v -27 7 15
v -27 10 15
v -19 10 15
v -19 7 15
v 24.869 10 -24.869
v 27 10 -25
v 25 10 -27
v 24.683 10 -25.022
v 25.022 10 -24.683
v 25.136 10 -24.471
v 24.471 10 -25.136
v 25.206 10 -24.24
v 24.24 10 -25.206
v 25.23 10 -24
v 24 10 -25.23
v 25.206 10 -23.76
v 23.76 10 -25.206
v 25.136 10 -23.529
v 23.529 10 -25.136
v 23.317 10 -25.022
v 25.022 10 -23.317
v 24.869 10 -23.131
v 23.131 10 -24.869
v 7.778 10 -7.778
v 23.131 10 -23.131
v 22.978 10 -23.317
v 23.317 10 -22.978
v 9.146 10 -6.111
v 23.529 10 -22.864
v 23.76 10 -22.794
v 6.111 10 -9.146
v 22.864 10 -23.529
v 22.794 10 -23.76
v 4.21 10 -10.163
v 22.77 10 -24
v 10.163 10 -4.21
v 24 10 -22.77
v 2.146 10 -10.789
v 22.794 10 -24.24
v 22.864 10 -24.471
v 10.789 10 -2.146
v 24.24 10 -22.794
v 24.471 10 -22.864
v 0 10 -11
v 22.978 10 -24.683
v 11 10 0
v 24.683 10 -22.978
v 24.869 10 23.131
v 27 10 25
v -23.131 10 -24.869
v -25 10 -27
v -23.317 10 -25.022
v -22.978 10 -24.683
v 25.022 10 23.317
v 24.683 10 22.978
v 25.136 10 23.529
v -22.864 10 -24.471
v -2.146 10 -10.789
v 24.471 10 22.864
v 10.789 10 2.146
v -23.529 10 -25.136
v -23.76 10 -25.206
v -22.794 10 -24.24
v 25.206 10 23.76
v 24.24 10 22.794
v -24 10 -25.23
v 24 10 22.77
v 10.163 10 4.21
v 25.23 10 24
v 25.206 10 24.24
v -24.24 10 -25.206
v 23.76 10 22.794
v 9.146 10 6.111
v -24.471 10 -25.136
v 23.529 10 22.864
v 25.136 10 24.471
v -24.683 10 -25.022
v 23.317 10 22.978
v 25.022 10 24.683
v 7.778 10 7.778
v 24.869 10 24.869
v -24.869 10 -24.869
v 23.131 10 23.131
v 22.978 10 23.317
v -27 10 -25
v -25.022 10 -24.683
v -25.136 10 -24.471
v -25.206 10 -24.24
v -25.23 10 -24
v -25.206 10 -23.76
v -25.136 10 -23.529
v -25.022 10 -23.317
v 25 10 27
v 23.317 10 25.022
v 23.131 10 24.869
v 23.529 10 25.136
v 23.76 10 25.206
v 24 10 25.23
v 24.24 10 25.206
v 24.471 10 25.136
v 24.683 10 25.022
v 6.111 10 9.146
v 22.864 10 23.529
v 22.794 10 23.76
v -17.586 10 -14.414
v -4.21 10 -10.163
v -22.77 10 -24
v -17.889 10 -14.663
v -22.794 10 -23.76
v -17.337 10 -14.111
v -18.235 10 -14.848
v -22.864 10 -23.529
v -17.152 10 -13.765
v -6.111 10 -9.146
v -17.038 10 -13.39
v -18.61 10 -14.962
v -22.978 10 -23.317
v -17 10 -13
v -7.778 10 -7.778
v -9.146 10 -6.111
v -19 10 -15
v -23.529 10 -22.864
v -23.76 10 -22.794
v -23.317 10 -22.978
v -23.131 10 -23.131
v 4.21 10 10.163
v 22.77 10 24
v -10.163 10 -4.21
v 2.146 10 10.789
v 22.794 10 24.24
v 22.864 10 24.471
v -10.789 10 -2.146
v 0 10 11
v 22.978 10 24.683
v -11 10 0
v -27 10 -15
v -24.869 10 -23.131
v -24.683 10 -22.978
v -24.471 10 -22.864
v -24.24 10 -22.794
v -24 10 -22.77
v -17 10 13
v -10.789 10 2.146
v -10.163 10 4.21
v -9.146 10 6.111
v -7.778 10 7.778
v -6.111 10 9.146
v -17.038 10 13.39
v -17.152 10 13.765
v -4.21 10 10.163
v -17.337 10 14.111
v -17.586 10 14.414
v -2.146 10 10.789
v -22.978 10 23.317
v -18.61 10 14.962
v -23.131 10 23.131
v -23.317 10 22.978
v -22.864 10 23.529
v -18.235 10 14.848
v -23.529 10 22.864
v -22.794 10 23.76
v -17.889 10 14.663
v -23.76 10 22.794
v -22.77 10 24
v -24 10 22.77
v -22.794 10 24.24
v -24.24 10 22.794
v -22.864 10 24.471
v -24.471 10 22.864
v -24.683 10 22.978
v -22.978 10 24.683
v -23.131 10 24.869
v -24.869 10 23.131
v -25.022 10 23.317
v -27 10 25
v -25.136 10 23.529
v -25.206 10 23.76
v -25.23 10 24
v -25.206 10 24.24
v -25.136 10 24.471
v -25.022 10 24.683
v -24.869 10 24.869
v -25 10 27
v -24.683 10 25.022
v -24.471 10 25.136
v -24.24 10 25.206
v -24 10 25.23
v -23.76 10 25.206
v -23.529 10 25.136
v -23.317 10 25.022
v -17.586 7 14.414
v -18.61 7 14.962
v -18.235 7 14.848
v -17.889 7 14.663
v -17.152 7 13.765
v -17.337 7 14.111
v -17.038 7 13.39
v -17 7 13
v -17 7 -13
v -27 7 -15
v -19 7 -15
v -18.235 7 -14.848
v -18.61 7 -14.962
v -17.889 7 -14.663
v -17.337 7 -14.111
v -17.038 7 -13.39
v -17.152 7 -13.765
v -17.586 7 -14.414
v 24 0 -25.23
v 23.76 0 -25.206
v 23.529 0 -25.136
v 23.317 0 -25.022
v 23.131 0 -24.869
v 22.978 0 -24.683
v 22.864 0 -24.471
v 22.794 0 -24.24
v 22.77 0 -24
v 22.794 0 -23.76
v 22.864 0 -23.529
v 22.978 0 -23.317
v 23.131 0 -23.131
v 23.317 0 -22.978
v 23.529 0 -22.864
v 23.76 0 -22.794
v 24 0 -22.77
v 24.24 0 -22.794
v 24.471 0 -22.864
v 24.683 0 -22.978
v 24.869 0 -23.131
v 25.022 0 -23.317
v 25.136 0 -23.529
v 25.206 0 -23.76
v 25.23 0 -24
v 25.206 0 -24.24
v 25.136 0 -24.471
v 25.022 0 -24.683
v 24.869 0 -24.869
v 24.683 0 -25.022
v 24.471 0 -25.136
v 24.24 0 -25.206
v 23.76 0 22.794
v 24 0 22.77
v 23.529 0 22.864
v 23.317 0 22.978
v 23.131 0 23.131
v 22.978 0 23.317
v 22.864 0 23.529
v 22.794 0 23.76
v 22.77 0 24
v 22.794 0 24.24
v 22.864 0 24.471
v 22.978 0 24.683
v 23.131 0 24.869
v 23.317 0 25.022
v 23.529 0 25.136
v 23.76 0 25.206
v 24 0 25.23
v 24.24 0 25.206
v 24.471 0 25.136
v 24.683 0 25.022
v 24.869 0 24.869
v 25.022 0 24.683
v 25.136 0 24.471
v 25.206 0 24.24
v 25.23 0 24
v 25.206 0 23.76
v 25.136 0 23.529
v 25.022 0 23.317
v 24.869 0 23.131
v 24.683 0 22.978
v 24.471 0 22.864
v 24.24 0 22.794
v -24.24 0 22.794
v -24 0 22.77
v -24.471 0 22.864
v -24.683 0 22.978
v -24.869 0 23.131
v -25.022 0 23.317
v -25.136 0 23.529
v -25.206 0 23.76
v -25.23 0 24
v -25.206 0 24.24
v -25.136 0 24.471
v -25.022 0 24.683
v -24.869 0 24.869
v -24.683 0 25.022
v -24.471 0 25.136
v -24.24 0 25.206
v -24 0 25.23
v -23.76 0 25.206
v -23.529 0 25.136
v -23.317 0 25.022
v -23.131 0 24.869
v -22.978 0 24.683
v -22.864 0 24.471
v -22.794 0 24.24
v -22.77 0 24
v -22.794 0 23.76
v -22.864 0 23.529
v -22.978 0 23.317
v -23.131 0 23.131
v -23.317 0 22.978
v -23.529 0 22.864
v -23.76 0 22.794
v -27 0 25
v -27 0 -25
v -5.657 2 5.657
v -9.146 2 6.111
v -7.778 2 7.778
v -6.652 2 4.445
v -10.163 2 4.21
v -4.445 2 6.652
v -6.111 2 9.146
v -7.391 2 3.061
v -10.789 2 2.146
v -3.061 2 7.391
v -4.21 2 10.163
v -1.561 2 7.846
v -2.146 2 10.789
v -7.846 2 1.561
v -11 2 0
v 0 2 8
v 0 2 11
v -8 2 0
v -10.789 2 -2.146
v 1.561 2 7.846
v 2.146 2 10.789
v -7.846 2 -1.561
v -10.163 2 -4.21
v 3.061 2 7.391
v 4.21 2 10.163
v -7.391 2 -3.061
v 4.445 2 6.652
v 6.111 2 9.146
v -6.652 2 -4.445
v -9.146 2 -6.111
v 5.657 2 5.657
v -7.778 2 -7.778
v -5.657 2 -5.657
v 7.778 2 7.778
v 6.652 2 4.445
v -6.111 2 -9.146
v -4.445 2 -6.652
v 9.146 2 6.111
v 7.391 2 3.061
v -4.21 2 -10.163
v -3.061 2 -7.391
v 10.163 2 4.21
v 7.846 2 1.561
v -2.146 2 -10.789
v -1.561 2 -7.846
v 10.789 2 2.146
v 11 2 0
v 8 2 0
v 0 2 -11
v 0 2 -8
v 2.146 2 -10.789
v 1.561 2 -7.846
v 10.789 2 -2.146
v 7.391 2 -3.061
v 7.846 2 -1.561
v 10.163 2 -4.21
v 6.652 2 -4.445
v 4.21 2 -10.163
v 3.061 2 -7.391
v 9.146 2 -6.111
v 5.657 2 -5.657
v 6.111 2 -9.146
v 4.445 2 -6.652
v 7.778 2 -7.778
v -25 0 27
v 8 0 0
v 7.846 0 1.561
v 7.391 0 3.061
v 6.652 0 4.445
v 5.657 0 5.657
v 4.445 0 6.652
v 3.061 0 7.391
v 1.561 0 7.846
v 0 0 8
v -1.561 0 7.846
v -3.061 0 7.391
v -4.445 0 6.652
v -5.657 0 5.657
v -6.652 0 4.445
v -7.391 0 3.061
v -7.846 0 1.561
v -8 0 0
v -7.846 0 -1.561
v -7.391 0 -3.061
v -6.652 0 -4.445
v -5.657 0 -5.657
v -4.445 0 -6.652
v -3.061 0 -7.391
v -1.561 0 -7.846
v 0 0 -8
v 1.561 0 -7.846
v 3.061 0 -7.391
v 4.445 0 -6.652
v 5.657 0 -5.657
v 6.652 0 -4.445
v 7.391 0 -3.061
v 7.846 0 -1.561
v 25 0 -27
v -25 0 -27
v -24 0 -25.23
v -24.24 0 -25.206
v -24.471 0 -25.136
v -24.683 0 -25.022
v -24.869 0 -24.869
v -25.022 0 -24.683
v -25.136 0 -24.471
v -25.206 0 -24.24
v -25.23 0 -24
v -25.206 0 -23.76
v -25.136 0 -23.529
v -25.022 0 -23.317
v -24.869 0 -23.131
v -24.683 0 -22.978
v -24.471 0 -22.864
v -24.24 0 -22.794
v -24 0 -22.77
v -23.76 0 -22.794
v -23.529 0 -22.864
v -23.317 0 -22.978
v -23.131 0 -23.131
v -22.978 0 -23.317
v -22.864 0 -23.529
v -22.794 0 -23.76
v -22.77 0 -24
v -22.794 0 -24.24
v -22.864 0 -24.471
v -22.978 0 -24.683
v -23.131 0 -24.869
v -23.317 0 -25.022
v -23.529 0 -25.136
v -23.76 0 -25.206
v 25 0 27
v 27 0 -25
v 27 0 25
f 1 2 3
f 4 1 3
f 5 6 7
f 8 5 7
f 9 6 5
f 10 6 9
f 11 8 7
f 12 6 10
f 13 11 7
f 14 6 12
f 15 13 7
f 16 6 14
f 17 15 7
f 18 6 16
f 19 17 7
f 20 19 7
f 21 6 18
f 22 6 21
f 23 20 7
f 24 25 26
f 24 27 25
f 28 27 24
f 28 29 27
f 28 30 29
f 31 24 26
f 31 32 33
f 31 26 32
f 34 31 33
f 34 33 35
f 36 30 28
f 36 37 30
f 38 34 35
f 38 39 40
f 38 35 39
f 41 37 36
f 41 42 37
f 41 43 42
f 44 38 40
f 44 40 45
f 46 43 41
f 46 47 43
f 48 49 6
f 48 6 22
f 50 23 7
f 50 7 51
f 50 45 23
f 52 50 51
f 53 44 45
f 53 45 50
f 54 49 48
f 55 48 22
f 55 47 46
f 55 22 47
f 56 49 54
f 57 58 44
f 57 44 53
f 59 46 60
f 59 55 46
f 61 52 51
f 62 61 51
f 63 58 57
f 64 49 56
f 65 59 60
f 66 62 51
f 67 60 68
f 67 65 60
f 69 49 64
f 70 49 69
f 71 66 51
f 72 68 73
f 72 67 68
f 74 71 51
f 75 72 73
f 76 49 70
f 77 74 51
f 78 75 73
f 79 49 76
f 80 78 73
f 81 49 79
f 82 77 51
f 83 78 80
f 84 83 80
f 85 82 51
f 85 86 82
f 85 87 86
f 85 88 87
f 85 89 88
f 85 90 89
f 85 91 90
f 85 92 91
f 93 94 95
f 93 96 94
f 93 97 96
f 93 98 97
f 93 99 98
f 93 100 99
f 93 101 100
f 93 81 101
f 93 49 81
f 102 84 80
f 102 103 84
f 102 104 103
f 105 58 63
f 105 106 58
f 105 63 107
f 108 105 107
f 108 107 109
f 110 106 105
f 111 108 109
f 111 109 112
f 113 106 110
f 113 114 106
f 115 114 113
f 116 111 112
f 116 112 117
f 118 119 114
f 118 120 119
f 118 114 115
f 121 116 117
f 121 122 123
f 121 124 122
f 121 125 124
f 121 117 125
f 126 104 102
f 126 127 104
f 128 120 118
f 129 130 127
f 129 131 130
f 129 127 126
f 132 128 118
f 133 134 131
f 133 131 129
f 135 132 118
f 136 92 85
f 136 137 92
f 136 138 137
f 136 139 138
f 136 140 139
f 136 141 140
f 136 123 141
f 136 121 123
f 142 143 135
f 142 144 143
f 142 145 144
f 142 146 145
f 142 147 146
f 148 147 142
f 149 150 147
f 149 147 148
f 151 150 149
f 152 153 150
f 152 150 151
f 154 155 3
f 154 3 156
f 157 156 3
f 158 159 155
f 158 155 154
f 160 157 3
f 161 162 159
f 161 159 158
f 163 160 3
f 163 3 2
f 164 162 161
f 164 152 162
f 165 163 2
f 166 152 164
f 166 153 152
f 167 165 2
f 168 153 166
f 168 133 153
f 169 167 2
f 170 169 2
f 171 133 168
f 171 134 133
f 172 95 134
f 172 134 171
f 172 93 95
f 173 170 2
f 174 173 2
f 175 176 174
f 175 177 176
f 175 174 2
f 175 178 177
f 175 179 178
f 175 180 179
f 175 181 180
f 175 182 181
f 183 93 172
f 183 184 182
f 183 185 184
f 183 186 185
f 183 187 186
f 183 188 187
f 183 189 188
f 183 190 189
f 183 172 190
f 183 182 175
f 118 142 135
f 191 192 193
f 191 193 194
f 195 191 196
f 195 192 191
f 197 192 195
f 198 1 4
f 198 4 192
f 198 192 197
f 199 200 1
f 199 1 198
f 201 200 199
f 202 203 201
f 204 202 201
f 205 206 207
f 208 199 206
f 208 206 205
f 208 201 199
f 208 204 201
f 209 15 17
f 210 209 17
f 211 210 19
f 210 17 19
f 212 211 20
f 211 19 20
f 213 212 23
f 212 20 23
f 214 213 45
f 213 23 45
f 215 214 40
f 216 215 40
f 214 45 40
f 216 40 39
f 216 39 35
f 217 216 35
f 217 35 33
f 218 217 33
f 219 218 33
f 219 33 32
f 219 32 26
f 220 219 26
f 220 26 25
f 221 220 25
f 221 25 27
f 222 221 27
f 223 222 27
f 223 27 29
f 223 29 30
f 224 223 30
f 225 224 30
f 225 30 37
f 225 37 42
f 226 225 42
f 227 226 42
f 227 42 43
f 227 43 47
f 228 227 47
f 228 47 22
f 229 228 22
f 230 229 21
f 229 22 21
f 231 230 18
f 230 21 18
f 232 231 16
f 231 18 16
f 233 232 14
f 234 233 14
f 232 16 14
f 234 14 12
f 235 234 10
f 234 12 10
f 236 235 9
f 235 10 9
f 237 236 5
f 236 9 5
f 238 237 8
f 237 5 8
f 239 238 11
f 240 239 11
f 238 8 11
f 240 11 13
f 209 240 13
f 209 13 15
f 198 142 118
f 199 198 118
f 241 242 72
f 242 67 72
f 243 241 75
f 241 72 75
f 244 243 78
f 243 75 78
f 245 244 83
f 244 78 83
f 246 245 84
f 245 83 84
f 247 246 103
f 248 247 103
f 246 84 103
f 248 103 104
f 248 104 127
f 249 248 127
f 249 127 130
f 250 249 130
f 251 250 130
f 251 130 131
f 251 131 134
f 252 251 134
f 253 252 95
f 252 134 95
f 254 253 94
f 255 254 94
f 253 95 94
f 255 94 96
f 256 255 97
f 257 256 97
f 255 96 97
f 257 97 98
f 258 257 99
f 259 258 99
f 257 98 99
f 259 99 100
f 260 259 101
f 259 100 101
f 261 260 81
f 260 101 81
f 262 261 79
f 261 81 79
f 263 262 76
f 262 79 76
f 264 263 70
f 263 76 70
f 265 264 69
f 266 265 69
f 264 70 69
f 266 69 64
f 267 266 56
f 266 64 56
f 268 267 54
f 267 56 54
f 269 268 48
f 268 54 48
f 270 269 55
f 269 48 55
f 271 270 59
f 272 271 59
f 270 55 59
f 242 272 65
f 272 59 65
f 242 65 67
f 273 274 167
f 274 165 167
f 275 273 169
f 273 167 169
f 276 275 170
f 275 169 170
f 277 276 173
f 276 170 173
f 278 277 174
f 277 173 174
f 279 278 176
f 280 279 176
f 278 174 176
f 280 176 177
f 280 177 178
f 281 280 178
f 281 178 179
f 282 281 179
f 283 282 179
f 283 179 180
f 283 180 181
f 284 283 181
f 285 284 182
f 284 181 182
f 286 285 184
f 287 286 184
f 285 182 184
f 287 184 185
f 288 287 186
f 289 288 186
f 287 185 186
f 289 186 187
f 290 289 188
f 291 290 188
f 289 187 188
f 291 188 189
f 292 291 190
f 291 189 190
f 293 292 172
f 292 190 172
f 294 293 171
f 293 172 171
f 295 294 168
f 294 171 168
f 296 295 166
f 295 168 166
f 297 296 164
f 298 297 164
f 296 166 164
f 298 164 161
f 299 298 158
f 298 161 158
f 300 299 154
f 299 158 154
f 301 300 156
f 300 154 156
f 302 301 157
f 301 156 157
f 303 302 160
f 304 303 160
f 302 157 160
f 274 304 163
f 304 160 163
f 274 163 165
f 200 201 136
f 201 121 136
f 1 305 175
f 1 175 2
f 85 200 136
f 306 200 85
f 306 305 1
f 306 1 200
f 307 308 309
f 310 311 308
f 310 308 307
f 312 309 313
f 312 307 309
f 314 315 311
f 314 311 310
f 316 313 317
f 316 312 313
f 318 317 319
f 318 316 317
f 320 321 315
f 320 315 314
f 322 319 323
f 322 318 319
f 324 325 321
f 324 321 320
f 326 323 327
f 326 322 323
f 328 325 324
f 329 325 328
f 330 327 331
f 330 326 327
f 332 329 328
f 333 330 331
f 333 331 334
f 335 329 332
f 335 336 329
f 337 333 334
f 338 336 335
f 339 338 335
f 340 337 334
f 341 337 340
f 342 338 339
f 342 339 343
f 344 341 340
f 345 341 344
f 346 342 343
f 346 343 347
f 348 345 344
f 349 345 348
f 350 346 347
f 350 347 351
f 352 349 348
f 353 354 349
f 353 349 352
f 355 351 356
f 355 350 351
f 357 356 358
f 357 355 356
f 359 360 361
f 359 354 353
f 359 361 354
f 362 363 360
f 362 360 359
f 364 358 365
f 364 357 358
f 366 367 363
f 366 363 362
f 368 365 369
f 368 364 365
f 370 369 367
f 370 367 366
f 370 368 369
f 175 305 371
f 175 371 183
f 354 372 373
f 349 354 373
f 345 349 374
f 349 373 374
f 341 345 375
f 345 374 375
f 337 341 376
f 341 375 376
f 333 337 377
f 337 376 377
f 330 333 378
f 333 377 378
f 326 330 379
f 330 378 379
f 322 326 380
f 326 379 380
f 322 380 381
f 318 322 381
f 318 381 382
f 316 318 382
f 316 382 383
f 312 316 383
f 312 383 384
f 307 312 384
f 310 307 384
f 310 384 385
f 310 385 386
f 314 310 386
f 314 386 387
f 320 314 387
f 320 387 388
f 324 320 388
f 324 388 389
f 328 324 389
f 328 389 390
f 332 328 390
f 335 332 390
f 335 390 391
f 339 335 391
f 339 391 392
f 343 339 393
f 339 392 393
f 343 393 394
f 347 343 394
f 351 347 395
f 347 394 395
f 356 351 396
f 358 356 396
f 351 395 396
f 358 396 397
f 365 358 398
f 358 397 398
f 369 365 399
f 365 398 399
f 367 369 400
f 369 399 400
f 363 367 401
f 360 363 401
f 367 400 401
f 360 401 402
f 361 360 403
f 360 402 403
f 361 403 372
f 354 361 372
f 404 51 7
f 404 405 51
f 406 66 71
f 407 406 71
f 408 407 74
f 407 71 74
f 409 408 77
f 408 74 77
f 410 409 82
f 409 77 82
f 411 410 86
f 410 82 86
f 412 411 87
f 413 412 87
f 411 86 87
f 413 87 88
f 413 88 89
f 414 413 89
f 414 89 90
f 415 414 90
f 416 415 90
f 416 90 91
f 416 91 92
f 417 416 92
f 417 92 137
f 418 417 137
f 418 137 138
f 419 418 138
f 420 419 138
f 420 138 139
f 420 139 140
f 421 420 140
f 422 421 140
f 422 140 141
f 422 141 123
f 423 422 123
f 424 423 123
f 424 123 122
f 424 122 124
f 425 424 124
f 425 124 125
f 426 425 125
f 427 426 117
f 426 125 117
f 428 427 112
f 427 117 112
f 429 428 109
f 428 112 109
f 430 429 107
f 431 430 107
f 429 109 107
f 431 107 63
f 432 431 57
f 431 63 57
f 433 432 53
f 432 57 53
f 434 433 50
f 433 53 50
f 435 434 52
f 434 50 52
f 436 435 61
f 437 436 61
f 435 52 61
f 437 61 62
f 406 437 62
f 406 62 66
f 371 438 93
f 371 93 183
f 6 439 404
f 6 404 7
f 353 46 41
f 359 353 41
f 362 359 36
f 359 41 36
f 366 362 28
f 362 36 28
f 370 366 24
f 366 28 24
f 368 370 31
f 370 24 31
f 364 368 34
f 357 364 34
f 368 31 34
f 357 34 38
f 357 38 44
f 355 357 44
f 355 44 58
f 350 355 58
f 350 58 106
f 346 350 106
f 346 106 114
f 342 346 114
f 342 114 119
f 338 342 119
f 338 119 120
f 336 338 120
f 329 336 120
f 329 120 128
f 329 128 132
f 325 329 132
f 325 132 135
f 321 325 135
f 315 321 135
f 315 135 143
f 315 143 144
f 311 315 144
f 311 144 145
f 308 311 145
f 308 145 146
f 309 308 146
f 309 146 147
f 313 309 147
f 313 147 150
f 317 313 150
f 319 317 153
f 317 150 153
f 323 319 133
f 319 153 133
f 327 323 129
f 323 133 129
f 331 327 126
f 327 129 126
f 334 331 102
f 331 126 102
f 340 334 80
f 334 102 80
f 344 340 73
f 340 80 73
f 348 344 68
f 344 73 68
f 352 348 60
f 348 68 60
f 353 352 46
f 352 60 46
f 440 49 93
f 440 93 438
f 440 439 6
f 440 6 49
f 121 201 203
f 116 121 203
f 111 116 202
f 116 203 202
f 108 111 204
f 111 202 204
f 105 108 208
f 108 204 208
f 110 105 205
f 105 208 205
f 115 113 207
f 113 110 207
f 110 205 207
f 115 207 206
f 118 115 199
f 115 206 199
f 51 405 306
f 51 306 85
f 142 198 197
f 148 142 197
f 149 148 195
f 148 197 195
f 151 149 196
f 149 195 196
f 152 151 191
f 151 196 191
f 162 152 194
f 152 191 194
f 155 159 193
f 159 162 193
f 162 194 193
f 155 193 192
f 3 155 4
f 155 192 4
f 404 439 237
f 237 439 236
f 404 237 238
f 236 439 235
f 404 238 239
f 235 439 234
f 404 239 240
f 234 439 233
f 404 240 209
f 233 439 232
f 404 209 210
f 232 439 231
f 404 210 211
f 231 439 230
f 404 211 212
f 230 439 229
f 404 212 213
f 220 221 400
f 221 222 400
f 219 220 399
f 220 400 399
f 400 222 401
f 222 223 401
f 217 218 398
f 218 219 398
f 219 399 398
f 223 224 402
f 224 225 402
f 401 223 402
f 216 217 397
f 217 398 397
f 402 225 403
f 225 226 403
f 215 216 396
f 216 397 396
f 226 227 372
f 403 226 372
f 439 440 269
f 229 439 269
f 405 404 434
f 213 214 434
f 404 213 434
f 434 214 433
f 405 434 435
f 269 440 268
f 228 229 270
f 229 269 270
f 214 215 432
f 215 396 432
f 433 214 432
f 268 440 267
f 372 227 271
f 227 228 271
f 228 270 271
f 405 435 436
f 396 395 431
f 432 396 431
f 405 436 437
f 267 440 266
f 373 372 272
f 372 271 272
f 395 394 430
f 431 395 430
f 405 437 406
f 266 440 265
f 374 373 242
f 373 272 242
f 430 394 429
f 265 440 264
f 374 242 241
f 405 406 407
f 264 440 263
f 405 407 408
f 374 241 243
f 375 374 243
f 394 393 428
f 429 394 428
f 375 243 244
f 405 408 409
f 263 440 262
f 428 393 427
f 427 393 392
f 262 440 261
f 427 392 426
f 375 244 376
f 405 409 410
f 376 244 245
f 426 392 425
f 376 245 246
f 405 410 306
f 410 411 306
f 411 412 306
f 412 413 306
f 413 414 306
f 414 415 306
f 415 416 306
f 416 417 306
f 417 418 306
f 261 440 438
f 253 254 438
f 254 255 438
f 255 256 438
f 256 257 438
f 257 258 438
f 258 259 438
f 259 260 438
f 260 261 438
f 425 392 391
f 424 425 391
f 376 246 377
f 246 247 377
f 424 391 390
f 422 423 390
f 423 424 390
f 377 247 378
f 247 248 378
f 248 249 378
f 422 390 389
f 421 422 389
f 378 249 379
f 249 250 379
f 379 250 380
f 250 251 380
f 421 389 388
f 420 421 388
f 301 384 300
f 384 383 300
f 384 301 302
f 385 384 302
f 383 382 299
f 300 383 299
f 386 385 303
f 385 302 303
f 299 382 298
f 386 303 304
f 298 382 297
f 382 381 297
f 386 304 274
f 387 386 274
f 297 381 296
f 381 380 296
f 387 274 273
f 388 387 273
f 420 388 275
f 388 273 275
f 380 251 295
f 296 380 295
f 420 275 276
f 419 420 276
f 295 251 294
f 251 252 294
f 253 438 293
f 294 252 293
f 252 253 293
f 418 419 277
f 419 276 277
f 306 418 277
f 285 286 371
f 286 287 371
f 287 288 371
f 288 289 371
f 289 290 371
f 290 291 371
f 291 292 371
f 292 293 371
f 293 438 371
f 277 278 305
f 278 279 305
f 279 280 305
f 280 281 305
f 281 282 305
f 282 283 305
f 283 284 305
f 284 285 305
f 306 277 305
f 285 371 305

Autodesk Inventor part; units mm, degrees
ref_plane "YZ Plane" through (0, 0, 0) normal (1, 0, 0) x (0, 1, 0)
ref_plane "XZ Plane" through (0, 0, 0) normal (0, 1, 0) x (-1, 0, 0)
ref_plane "XY Plane" through (0, 0, 0) normal (0, 0, 1) x (1, 0, 0)
sketch "Skizze1" plane through (0, 0, 0) normal (0, 1, 0) x (-1, 0, 0)
  line L0 (-27, 27) -> (27, 27)
  line L1 (27, 27) -> (27, -27)
  line L2 (27, -27) -> (-27, -27)
  line L3 (-27, -27) -> (-27, 27)
  line L4 (-27, 27) -> (27, -27) construction
  line L5 (27, 27) -> (-27, -27) construction
  point P0 (0, 0)
  dimension "d0" = 54
  dimension "d1" = 54
extrude "Extrusion1" add sketch "Skizze1" along normal blind 10
chamfer "Fase1" distance 2 angle 45 4 edges at (27, 5, 27) (27, 5, -27) (-27, 5, 27) (-27, 5, -27)
sketch "Skizze2" plane through (0, 10, 0) normal (0, 1, 0) x (1, 0, 0)
  circle A0 centre (0, 0) radius 11
  dimension "d7" = 22
extrude "Extrusion2" cut sketch "Skizze2" against normal blind 8
sketch "Skizze5" plane through (0, 0, 0) normal (0, -1, 0) x (1, 0, 0)
  line L0 (-24, -24) -> (24, -24)
  line L1 (24, -24) -> (24, 24)
  line L2 (24, 24) -> (-24, 24)
  line L3 (-24, 24) -> (-24, -24)
  line L4 (-24, -24) -> (24, 24) construction
  line L5 (24, -24) -> (-24, 24) construction
  point P0 (0, 0)
  dimension "d22" = 48
  dimension "d23" = 48
hole "Bohrung2" at (-24, 0, -24) at (-24, 0, 24) at (24, 0, 24) at (24, 0, -24) direction (0, 1, 0) diameter 2.459 end through all
sketch "Skizze6" plane through (0, 0, 0) normal (0, -1, 0) x (1, 0, 0)
  circle A0 centre (0, 0) radius 8
  dimension "d31" = 16
extrude "Extrusion4" cut sketch "Skizze6" against normal through all
sketch "Skizze7" plane through (0, 10, 0) normal (0, 1, 0) x (1, 0, 0)
  circle A0 centre (24, -24) radius 1.2295
  circle A1 centre (-24, 24) radius 1.2295
  circle A2 centre (-24, -24) radius 1.2295
  circle A3 centre (24, 24) radius 1.2295
  circle A4 centre (0, 0) radius 11
  line L0 (-27, 25) -> (-25, 27)
  line L1 (-27, 25) -> (-27, -25)
  line L2 (-25, -27) -> (-27, -25)
  line L3 (-25, -27) -> (25, -27)
  line L4 (27, -25) -> (25, -27)
  line L5 (27, -25) -> (27, 25)
  line L6 (25, 27) -> (27, 25)
  line L7 (25, 27) -> (-25, 27)
  line L8 (-27, -15) -> (-17, -15)
  line L9 (-17, -15) -> (-17, 15)
  line L10 (-17, 15) -> (-27, 15)
  line L11 (-27, 15) -> (-27, -15)
  dimension "d36" = 30
  dimension "d37" = 15
  dimension "d38" = 10
extrude "Extrusion5" cut sketch "Skizze7" against normal blind 3 contours L10 L9 L8 L1
fillet "Rundung1" radius 2 2 edges at (-17, 8.5, 15) (-17, 8.5, -15)
equation "\"d37\" = 0.5 * d36"
properties part number "bearing_mount_part_2"
